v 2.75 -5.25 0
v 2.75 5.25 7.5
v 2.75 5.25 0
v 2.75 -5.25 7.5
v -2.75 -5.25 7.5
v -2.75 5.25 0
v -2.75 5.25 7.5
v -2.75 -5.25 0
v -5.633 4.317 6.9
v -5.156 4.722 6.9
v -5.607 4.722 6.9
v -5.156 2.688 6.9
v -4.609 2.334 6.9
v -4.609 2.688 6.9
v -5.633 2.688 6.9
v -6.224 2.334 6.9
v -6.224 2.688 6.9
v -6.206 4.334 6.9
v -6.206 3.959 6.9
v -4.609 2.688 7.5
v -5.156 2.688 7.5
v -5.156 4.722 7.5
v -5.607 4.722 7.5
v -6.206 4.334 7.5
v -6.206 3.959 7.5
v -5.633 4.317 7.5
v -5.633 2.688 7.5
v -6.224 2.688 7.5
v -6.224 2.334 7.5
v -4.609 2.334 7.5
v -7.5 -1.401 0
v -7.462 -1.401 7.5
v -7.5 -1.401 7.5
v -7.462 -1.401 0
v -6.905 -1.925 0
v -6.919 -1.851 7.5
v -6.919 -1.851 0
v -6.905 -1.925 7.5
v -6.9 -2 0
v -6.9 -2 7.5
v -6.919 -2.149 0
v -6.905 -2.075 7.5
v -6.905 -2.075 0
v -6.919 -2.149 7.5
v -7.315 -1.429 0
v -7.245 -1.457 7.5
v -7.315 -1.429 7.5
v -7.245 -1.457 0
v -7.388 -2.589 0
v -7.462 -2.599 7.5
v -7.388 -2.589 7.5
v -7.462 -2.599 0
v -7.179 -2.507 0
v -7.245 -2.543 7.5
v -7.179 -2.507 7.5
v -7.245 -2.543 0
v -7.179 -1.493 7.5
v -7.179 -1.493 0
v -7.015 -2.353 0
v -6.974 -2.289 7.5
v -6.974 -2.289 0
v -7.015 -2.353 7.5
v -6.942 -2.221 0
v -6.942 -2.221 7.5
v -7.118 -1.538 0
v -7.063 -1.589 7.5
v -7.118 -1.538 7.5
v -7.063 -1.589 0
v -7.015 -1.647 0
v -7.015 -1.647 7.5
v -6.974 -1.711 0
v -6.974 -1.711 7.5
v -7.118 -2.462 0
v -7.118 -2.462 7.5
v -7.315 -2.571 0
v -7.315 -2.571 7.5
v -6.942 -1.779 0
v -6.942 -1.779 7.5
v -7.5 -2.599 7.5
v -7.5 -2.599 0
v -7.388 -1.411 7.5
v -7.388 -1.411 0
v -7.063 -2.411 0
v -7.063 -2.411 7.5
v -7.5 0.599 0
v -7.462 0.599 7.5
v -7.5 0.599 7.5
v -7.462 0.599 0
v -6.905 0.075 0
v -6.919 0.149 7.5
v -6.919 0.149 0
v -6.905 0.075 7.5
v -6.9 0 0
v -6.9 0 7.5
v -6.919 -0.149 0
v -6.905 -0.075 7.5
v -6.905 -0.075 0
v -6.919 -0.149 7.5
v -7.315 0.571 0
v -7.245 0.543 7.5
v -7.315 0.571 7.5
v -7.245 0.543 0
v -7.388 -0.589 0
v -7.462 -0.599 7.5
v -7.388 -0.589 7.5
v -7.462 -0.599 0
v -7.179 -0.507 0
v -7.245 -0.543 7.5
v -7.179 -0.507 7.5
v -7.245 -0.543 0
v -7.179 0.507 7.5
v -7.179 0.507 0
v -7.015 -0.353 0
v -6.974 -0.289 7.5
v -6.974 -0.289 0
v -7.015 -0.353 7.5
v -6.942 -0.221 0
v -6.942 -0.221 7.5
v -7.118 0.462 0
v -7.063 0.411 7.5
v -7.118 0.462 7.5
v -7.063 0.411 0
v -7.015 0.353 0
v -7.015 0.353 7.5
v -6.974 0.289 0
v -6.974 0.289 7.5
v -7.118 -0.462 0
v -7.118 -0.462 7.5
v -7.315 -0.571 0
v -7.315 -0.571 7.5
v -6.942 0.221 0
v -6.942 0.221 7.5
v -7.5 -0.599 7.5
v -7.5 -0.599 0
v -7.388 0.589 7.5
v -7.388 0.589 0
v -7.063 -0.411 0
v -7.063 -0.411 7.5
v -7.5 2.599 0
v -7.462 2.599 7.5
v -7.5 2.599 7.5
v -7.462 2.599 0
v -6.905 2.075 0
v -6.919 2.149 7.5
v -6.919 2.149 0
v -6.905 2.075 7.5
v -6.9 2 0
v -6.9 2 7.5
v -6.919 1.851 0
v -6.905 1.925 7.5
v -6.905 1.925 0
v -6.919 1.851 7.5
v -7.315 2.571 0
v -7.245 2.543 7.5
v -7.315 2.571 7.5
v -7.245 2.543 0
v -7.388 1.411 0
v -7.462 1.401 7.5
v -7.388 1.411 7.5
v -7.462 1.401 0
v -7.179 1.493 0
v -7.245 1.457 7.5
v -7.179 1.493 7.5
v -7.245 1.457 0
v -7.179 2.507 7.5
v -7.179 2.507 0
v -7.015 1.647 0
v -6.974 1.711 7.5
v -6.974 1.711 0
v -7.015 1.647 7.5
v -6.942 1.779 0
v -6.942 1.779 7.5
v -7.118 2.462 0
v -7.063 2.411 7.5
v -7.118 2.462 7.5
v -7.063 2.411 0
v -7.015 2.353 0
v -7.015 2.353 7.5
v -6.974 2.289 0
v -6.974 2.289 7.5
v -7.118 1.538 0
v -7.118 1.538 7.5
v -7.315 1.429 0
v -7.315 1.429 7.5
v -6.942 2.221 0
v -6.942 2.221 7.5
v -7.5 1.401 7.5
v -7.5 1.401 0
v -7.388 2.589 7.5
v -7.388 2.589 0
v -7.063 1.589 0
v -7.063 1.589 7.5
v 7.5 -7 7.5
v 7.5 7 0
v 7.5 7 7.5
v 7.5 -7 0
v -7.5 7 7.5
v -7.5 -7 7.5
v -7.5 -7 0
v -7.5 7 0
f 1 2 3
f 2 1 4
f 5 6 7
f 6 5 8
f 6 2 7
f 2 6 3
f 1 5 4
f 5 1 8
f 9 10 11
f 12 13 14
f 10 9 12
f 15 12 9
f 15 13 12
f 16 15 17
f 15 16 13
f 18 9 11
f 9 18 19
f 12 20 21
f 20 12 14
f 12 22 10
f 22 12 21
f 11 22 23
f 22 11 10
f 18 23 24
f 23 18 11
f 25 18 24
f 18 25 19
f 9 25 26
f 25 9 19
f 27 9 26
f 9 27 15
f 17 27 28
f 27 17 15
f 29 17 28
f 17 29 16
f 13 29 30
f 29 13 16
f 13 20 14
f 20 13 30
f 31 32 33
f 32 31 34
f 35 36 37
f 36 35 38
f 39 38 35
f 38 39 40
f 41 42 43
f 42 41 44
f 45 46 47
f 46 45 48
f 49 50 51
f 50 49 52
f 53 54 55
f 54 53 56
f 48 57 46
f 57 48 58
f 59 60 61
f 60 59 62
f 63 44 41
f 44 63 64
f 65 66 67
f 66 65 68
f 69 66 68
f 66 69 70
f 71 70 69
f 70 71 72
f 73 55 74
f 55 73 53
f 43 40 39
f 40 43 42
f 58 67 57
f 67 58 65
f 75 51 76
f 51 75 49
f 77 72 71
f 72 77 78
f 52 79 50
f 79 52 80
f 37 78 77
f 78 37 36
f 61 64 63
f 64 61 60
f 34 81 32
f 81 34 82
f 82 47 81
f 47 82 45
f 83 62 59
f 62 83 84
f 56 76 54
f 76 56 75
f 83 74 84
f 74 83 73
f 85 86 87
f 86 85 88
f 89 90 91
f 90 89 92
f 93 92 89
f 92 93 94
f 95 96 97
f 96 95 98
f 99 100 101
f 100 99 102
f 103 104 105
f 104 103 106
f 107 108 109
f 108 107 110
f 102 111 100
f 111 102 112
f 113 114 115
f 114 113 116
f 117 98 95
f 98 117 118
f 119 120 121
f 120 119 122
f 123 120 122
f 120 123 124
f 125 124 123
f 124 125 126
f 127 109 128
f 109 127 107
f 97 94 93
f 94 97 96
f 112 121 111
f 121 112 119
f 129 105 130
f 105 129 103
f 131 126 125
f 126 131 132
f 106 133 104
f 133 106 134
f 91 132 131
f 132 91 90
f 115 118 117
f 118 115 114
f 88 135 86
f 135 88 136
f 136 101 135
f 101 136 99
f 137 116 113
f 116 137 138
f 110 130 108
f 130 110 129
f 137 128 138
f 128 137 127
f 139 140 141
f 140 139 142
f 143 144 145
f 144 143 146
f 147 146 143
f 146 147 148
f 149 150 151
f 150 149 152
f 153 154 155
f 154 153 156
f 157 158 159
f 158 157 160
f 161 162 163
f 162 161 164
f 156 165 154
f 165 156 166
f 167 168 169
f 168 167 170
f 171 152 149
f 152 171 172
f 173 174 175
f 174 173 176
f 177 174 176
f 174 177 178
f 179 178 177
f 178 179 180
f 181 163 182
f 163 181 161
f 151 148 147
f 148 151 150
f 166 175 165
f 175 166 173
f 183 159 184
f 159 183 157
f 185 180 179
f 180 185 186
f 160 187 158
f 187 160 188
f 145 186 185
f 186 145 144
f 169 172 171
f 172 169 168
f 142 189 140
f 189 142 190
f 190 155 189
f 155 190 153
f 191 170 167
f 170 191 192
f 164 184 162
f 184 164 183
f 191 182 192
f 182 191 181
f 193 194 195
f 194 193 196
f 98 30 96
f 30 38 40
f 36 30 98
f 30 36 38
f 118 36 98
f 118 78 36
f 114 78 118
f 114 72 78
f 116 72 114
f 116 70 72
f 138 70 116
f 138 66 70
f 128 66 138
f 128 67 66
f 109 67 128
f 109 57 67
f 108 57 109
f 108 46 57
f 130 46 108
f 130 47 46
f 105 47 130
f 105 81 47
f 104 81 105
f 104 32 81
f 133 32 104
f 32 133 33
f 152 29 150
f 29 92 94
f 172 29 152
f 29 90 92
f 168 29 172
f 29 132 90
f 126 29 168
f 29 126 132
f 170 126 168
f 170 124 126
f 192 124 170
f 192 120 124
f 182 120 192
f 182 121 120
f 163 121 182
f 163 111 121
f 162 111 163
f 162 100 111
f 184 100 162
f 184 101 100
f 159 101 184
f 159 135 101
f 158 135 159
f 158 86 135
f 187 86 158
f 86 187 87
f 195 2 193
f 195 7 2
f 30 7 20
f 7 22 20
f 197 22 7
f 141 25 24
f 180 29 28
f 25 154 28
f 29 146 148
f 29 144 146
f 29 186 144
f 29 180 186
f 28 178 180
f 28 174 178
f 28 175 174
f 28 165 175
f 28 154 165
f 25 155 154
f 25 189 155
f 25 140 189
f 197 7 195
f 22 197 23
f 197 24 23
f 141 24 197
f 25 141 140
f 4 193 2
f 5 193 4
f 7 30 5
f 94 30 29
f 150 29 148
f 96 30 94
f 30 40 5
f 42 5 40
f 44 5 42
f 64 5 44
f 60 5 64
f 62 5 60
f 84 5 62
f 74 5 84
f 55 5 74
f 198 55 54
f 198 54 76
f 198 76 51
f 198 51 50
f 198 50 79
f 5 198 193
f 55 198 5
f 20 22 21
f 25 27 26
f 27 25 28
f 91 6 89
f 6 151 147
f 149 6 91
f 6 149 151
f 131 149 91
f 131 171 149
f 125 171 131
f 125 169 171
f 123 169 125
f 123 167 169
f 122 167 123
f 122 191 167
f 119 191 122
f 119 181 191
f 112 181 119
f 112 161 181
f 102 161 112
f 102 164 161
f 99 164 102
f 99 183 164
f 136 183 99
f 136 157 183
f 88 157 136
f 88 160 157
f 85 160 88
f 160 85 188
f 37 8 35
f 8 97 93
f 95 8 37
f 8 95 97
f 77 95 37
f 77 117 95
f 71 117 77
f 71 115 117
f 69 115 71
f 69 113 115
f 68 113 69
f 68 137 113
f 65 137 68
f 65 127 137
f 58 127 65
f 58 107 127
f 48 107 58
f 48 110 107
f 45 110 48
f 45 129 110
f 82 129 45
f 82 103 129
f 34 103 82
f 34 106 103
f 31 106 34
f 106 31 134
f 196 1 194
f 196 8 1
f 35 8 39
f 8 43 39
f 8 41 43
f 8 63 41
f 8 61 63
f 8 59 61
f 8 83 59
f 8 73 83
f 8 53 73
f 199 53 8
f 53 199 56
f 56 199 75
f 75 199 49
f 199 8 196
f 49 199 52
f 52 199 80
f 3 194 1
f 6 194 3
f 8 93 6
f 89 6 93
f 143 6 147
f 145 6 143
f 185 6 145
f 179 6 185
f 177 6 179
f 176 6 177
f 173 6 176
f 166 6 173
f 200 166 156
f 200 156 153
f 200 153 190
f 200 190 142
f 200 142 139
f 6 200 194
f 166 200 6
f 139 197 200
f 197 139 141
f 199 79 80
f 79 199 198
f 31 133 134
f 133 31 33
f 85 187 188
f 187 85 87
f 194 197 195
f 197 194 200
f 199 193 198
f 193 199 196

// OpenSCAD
$fn = 50;

difference() {
	union() {
		translate(v = [0, -5, 0]) {
			rotate(a = [0, 0, 0]) {
				difference() {
					union() {
						translate(v = [-7.5, -2.0, 0]) {
							cube(size = [15.0, 14.0, 7.5]);
						}
					}
					union() {
						translate(v = [-2.75, -0.25, -0.1]) {
							cube(size = [5.5, 10.5, 7.7]);
						}
						translate(v = [-5.5, 8.5, 6.9]) {
							linear_extrude(height = 0.7) {
								text(font = "Arial:style=Bold", halign = "center", size = 2.5, text = "1", valign = "center");
							}
						}
						translate(v = [-7.5, 3, -0.1]) {
							cylinder(h = 7.7, r = 0.6);
						}
						translate(v = [-7.5, 5, -0.1]) {
							cylinder(h = 7.7, r = 0.6);
						}
						translate(v = [-7.5, 7, -0.1]) {
							cylinder(h = 7.7, r = 0.6);
						}
					}
				}
			}
		}
	}
	union();
}
